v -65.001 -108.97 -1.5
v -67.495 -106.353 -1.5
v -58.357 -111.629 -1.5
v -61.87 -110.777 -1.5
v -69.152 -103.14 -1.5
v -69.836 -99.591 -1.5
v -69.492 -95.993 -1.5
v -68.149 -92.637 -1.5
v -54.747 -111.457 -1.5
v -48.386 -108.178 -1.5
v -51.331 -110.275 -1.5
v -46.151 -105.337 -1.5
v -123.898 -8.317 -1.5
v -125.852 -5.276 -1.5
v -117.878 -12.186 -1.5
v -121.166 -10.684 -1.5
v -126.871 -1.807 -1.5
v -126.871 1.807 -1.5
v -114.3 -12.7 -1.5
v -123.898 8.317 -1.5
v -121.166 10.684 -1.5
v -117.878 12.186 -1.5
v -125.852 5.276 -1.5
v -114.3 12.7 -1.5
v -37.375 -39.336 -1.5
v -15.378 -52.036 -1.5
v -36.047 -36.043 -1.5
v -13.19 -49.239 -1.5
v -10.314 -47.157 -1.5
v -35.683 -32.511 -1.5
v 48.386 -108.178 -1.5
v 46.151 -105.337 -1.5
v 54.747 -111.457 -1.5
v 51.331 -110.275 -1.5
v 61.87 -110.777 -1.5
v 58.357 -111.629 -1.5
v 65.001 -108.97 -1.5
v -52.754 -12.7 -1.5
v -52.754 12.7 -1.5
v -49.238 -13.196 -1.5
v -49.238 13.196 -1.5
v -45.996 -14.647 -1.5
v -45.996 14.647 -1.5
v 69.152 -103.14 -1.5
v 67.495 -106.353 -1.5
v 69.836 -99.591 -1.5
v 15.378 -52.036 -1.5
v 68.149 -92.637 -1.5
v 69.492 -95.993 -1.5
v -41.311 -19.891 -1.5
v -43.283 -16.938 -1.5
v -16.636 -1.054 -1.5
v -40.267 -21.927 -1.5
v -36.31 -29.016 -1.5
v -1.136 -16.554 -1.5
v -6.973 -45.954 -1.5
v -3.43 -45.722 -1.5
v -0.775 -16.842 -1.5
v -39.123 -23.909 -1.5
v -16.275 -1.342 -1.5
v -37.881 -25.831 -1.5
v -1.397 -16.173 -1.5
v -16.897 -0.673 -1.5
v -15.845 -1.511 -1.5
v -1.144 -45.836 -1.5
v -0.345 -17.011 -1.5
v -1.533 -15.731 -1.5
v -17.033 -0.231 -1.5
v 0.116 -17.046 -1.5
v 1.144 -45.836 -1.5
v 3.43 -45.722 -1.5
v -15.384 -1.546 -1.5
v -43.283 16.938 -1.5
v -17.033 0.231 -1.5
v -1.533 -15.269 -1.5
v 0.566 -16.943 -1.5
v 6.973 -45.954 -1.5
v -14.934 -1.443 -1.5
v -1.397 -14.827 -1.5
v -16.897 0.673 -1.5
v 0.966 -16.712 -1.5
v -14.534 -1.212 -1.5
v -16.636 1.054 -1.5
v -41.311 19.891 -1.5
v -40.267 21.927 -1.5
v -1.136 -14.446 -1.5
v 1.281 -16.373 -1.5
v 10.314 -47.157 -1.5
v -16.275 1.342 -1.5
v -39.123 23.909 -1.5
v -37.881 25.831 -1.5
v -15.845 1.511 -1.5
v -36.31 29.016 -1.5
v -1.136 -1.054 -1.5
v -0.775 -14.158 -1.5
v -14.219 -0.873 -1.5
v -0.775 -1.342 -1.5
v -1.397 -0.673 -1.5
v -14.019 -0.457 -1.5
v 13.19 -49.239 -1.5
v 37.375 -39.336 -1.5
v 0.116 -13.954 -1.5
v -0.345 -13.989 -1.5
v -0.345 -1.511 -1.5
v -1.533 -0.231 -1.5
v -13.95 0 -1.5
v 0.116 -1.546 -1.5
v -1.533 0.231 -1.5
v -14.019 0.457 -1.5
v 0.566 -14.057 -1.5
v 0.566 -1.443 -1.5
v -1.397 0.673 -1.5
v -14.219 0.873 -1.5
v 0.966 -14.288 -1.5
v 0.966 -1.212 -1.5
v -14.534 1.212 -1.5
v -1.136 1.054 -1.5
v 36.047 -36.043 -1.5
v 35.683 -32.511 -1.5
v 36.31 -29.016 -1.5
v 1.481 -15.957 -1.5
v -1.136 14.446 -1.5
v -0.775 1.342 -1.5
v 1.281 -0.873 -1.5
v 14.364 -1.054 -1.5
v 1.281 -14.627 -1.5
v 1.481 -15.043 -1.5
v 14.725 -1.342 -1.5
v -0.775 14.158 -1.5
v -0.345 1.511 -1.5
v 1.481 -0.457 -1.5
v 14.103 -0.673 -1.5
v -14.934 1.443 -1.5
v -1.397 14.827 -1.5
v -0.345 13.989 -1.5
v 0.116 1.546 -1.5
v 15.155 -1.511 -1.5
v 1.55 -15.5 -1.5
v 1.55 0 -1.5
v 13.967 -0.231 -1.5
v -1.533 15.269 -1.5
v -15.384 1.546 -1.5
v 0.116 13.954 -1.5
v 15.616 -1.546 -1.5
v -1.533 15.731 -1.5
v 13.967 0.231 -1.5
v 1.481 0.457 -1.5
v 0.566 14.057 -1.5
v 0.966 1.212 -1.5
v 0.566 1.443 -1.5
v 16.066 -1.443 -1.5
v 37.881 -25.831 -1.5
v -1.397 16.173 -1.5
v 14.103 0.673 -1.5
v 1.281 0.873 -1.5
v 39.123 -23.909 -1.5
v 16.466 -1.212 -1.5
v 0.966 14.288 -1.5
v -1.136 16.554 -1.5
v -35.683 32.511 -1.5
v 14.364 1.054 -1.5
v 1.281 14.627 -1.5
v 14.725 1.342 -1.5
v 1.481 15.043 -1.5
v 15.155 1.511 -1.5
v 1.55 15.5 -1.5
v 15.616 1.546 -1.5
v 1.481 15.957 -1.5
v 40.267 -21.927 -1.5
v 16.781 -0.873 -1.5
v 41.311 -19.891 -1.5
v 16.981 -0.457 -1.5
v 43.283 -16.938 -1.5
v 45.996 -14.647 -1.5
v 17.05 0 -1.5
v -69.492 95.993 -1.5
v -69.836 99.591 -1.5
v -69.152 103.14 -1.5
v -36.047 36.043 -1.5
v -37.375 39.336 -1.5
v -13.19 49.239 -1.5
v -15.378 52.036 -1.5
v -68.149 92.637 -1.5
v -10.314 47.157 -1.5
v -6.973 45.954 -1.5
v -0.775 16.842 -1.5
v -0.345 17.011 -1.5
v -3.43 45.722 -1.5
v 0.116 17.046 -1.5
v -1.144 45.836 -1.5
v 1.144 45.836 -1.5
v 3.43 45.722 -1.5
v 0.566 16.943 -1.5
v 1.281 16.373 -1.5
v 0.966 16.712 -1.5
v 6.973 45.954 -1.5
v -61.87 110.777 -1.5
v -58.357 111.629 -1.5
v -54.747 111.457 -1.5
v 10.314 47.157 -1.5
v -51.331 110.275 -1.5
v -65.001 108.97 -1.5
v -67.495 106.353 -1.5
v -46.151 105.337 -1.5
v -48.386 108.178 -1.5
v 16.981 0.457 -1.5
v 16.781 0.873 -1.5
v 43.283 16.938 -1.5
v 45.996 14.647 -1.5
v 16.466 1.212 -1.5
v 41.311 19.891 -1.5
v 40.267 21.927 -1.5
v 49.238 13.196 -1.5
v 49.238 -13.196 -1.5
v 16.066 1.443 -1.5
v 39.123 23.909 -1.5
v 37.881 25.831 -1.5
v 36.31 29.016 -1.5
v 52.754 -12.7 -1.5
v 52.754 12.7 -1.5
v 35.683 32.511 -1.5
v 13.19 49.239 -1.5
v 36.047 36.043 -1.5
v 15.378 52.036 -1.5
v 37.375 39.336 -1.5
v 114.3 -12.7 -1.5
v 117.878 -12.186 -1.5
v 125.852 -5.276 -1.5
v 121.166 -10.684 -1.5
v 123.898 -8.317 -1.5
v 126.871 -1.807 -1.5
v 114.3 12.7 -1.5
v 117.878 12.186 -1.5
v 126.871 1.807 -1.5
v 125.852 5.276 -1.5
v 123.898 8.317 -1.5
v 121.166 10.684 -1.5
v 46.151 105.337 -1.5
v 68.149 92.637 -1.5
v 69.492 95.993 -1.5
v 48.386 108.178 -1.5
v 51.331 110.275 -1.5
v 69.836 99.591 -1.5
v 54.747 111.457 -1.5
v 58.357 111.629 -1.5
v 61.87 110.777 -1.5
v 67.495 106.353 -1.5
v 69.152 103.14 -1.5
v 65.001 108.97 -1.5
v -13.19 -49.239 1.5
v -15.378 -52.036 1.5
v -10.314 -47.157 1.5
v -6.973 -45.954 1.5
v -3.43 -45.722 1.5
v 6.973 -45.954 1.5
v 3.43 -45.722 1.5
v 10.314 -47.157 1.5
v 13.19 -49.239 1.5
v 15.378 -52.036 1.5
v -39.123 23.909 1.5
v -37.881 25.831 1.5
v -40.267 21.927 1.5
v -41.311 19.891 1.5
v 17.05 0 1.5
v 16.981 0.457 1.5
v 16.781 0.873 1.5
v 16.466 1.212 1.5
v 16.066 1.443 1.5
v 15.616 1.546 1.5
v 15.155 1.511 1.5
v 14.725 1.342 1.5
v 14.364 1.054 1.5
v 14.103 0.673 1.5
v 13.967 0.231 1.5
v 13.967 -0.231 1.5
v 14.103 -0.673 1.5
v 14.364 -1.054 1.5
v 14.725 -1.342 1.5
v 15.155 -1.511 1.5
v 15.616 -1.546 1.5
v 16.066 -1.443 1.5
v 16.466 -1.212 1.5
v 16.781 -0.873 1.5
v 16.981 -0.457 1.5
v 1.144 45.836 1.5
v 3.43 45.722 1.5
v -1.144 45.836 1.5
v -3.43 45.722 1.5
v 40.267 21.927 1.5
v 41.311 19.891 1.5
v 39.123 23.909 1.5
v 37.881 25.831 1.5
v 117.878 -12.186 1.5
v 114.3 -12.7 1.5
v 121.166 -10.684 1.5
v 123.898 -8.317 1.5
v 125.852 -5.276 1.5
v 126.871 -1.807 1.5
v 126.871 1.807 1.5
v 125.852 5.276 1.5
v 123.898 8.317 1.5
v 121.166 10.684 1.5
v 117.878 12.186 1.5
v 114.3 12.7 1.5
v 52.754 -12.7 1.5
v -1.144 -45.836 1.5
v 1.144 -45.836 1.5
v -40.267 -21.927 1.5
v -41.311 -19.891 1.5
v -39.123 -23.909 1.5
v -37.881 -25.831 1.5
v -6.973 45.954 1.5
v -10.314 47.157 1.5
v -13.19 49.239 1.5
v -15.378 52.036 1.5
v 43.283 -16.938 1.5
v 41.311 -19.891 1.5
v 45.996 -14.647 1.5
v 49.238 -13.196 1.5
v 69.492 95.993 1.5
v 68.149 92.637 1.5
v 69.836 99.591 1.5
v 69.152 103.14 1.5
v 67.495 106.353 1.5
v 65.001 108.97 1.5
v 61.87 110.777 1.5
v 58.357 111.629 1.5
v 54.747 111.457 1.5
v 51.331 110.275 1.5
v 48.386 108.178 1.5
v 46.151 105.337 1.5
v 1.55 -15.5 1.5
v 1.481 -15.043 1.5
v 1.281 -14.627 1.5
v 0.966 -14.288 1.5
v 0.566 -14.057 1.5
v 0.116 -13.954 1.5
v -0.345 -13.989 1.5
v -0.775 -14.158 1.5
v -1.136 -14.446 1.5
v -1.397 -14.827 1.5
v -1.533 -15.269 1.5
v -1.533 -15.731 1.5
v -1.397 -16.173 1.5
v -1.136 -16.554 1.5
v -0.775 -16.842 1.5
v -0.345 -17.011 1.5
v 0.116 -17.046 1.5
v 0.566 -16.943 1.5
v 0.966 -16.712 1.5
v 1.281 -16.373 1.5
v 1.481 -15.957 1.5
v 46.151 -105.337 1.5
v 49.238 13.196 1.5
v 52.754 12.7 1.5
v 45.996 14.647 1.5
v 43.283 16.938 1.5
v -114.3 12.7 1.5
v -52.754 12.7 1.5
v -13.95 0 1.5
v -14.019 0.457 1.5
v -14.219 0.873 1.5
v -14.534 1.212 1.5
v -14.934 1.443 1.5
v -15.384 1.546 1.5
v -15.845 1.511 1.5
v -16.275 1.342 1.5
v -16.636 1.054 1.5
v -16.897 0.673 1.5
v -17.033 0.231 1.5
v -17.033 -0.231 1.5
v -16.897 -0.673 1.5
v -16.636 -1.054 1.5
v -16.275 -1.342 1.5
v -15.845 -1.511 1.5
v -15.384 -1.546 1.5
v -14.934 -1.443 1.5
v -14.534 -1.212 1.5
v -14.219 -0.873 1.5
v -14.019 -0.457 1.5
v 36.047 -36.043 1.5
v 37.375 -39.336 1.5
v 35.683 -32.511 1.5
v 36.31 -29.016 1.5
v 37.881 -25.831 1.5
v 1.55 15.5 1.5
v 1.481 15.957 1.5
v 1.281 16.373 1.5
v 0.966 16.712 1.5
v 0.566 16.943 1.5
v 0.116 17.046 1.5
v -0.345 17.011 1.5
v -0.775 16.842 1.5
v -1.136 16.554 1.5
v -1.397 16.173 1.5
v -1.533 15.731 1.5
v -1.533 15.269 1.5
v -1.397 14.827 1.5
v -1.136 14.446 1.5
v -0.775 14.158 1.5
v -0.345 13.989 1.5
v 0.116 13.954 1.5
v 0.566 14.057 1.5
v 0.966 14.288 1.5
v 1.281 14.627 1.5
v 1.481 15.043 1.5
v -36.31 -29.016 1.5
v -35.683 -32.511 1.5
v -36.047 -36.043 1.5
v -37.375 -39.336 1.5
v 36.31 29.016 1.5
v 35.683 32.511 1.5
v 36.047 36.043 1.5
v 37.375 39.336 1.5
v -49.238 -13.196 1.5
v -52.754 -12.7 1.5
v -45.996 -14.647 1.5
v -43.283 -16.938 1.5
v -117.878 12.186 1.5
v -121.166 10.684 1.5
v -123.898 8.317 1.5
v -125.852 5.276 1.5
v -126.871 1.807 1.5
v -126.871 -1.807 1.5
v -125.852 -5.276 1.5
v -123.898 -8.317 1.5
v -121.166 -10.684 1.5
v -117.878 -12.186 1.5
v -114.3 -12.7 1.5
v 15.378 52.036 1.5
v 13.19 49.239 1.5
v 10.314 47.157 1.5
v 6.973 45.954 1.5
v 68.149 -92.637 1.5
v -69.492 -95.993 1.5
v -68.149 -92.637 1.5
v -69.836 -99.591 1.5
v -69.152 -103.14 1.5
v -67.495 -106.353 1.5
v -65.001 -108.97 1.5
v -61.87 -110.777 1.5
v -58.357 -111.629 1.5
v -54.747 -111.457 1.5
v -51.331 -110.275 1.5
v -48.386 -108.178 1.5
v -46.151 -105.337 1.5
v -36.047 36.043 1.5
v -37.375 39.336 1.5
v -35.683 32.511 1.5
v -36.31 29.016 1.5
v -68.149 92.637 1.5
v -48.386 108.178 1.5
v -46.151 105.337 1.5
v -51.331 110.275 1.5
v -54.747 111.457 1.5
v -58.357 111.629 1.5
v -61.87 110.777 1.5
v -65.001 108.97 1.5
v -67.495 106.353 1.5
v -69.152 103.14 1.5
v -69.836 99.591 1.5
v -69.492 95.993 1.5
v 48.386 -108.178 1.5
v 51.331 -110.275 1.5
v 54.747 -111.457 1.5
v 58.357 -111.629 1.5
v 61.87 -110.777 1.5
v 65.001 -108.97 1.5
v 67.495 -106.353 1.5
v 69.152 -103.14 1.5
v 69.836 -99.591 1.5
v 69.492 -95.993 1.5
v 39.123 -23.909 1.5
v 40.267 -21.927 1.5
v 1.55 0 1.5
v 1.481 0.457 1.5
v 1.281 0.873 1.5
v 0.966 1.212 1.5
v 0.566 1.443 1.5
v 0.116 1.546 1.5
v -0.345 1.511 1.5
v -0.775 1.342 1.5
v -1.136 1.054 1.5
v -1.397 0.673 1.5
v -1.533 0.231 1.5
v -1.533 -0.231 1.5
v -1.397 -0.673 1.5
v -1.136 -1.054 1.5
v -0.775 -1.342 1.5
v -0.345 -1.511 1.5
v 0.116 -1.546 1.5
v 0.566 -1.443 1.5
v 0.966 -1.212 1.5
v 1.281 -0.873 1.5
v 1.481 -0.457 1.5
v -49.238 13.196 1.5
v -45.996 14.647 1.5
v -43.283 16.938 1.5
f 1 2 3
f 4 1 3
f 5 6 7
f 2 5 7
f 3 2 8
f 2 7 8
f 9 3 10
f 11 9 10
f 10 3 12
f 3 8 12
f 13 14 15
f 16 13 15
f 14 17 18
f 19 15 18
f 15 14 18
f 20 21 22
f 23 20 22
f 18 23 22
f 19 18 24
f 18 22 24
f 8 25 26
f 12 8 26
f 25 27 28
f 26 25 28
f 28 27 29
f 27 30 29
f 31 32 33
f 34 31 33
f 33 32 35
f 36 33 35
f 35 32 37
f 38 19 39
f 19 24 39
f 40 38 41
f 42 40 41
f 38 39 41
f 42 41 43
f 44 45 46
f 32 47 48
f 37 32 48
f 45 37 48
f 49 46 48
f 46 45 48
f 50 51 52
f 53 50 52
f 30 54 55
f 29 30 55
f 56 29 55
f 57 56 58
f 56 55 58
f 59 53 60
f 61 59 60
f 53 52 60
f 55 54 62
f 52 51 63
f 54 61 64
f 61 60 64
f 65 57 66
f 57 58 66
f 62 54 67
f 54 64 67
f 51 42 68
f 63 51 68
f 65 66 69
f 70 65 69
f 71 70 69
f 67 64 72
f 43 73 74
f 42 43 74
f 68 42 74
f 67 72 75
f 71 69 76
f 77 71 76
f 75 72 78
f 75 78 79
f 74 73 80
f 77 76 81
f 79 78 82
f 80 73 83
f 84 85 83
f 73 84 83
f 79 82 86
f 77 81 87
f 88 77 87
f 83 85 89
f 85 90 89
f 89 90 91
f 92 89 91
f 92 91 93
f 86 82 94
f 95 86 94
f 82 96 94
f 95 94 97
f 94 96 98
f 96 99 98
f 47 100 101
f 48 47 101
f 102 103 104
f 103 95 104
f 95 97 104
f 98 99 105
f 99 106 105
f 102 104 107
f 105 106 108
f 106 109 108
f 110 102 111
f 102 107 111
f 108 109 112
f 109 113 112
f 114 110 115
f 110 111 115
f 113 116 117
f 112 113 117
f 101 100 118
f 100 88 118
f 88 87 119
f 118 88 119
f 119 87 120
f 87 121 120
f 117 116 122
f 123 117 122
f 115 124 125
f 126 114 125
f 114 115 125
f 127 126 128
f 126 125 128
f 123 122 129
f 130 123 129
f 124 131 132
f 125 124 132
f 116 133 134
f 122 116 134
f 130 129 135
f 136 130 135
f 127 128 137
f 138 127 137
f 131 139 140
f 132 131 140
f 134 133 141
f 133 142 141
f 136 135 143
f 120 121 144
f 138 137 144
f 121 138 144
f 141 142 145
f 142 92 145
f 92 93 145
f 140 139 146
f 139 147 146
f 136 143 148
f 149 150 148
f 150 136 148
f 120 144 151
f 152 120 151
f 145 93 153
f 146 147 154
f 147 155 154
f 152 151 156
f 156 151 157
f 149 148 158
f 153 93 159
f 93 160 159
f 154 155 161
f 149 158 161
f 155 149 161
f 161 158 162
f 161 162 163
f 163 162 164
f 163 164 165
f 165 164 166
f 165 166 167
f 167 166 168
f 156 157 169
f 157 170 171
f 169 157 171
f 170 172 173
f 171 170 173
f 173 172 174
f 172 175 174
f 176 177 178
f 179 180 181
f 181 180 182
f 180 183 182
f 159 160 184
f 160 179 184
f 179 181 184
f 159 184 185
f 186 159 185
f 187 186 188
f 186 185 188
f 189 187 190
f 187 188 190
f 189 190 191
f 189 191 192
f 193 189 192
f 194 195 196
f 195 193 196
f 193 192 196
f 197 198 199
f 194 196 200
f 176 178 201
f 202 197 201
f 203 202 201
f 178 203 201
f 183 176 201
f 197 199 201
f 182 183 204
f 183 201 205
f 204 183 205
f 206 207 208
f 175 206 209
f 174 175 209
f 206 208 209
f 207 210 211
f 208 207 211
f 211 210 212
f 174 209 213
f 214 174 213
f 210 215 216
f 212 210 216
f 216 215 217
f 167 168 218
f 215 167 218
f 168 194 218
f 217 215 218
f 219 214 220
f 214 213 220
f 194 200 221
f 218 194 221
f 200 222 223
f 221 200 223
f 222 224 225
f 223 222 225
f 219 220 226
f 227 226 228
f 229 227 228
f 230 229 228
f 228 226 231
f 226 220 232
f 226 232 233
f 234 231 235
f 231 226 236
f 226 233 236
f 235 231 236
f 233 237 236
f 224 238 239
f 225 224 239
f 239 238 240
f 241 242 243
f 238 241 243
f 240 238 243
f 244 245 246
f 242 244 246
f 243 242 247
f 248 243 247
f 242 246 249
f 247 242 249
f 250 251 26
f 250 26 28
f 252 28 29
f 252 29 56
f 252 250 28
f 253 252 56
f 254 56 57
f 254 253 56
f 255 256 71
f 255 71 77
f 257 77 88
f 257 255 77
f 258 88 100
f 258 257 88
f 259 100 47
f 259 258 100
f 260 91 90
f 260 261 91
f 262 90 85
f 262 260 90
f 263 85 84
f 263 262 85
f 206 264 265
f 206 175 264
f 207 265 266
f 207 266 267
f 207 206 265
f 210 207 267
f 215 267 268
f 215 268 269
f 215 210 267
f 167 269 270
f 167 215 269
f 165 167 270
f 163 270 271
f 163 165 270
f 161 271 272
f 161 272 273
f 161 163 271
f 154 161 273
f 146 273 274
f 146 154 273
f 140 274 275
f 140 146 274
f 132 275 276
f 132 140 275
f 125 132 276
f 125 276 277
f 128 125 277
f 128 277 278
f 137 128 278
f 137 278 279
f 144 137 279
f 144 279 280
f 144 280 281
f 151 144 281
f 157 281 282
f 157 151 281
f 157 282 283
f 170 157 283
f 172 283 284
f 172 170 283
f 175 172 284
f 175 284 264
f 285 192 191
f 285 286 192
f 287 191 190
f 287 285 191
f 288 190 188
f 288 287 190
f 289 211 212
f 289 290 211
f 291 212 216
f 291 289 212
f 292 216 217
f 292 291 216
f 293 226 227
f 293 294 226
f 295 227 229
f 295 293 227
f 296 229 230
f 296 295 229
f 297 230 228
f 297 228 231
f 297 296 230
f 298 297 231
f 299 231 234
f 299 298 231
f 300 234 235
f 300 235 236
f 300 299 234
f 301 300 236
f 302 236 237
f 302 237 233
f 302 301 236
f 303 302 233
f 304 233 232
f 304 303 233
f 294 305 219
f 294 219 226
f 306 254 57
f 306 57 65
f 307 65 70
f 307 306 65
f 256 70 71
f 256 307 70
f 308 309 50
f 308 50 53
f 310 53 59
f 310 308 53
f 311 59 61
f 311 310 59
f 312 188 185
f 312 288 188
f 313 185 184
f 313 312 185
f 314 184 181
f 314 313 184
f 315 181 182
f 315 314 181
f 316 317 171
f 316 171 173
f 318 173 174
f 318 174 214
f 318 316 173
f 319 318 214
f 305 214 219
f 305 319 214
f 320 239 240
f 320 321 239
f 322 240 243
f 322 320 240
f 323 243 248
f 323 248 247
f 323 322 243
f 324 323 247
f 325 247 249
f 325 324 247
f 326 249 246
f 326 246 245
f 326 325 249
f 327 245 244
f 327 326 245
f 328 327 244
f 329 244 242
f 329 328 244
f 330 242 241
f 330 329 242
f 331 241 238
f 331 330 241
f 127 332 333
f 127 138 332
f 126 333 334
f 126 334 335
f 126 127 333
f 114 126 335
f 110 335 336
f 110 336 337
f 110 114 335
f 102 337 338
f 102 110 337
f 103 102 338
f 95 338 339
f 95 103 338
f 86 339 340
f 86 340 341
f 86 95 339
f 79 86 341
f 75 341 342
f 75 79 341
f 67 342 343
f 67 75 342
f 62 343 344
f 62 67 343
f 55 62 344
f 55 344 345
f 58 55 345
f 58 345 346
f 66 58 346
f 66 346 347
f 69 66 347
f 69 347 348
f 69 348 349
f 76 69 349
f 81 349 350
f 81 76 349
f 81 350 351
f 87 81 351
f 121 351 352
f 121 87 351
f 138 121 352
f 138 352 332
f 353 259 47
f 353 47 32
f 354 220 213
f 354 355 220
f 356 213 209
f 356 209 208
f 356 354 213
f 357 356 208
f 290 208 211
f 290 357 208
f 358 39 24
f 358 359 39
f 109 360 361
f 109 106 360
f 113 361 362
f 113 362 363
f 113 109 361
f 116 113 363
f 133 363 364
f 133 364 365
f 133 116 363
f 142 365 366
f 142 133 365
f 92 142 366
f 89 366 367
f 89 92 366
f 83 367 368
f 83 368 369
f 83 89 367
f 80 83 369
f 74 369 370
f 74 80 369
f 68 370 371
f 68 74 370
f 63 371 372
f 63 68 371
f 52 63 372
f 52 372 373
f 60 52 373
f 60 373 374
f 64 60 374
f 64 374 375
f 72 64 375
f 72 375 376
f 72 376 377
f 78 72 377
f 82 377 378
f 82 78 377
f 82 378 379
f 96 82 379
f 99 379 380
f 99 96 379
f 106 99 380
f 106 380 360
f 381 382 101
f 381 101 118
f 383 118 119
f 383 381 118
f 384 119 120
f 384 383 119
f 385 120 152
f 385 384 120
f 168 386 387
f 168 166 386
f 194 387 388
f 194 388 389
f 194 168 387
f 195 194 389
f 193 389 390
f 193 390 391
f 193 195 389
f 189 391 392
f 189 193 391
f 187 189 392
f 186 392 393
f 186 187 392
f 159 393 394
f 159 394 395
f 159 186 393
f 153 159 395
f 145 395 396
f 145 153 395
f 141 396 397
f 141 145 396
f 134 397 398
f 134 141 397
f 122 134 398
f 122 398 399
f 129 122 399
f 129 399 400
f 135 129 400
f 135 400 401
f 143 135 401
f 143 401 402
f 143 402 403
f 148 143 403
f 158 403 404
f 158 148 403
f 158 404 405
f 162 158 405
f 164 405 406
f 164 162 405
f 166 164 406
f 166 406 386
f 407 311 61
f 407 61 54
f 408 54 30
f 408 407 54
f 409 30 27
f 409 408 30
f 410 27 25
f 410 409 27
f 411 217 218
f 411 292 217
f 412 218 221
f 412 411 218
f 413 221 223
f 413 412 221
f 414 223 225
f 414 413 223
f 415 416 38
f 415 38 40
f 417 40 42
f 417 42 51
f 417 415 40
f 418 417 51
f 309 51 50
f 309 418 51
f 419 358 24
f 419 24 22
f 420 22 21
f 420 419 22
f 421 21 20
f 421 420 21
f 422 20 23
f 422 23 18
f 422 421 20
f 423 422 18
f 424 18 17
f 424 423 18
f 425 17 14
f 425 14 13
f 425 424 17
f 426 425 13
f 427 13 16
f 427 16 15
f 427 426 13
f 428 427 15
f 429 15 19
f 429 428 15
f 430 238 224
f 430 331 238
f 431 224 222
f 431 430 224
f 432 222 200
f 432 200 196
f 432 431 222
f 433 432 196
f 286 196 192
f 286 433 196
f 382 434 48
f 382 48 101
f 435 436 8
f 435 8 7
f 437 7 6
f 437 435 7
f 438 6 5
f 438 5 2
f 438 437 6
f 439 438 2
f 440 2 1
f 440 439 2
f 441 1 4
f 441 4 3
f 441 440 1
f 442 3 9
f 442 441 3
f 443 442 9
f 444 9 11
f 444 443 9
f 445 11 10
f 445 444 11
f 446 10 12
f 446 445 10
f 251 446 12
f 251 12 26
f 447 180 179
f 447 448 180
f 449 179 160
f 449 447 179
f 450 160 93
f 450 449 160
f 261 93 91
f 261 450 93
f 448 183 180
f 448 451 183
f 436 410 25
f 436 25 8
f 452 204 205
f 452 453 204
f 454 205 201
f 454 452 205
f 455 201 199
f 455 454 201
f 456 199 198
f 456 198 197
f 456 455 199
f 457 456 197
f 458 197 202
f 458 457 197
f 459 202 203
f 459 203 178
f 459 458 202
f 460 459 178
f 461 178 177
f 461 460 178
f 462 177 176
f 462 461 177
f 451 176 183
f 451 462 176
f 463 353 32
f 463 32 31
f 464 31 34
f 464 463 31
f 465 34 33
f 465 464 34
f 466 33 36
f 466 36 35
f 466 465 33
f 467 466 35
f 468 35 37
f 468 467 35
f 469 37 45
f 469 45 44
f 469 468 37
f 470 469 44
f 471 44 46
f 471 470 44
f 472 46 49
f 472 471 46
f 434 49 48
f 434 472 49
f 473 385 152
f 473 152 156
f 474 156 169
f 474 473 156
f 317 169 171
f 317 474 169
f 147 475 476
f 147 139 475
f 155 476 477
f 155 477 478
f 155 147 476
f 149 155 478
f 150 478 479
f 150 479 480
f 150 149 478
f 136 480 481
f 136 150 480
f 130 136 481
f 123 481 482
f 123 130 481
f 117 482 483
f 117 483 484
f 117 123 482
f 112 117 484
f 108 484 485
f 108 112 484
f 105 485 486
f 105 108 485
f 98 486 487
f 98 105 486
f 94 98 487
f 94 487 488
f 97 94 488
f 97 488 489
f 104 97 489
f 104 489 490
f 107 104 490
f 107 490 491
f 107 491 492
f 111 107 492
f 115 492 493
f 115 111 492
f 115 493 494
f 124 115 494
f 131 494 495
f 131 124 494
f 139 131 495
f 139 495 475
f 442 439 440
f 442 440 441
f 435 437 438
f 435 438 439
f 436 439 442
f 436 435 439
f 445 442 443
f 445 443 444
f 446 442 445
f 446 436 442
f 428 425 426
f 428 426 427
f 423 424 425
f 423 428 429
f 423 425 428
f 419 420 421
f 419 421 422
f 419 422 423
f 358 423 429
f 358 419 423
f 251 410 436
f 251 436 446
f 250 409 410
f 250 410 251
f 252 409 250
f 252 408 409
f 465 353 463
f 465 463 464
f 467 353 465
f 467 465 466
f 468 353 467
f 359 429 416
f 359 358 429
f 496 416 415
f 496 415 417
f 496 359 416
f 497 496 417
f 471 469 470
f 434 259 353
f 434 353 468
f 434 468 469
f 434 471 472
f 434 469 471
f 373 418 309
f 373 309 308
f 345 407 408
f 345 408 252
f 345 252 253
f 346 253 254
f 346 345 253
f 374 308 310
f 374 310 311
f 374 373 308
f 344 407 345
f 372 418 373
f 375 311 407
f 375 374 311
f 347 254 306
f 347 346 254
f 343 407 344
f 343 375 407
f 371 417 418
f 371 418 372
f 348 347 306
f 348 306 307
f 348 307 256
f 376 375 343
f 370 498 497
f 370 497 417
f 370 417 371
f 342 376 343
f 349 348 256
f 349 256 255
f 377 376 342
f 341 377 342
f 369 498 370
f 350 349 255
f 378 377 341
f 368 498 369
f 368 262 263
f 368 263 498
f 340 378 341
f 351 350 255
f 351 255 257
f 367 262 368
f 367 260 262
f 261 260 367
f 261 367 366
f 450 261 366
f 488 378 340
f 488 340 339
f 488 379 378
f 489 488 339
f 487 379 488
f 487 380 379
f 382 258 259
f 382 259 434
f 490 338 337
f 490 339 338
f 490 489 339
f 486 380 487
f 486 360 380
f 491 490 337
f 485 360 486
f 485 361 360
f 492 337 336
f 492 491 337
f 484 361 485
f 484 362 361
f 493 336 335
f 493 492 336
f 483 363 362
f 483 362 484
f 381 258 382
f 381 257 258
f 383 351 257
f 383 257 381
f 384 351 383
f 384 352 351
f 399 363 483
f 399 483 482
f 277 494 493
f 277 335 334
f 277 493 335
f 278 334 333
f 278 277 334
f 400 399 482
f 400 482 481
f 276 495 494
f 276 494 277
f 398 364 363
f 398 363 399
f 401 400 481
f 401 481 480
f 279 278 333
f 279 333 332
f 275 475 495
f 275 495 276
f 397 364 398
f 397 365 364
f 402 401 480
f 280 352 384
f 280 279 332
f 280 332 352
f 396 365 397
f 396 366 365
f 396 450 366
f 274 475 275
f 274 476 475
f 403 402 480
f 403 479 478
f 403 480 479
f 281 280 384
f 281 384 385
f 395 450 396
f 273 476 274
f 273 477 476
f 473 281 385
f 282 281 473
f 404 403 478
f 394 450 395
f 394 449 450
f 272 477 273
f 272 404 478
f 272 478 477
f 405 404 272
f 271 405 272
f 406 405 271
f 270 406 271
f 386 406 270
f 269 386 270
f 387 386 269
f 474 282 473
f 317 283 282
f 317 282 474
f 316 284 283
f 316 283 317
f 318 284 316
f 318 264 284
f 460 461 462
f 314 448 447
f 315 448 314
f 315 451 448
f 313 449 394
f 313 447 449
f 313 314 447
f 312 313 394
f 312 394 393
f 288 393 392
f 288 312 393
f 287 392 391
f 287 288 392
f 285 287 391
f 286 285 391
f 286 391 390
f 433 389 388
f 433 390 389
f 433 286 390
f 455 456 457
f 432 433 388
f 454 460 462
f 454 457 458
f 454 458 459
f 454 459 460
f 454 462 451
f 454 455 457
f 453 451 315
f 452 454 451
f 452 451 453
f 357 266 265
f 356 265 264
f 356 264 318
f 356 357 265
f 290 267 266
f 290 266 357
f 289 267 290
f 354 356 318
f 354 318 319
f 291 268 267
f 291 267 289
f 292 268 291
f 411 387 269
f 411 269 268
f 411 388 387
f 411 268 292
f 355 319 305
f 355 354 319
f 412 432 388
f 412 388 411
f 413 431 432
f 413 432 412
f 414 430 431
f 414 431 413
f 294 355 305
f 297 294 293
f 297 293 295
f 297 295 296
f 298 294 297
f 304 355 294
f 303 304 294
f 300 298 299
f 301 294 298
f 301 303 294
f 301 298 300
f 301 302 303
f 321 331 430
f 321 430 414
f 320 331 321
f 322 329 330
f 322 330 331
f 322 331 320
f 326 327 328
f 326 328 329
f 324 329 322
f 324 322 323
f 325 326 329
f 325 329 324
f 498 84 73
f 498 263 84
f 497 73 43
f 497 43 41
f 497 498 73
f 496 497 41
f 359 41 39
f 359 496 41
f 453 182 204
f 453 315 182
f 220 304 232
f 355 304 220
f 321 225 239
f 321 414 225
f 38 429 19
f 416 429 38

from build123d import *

# Parameters (mm, degrees)
CROQUIS1_R              = 1.55
SALIENTE_EXTRUIR1_DEPTH = 1.5


with BuildPart() as part:
    # Croquis1 → Saliente-Extruir1 (new, symmetric)
    with BuildSketch(Plane.XY):
        with BuildLine():
            Line((-52.753601773, 12.7), (-114.3, 12.7))
            ThreePointArc((-114.3, 12.7), (-127, 0), (-114.3, -12.7))
            Line((-114.3, -12.7), (-52.753601773, -12.7))
            ThreePointArc((-52.753601773, -12.7), (-45.996397628, -14.646851989), (-41.310890543, -19.890520922))
            ThreePointArc((-41.310890543, -19.890520922), (-39.707264764, -22.925), (-37.881141685, -25.831020202))
            ThreePointArc((-37.881141685, -25.831020202), (-35.682744722, -32.510622834), (-37.375323514, -39.335959276))
            Line((-37.375323514, -39.335959276), (-68.148522628, -92.636703653))
            ThreePointArc((-68.148522628, -92.636703653), (-63.5, -109.985226281), (-46.151477372, -105.336703653))
            Line((-46.151477372, -105.336703653), (-15.378278258, -52.035959276))
            ThreePointArc((-15.378278258, -52.035959276), (-10.313652906, -47.157474823), (-3.429748858, -45.721541124))
            ThreePointArc((-3.429748858, -45.721541124), (0, -45.85), (3.429748858, -45.721541124))
            ThreePointArc((3.429748858, -45.721541124), (10.313652906, -47.157474823), (15.378278258, -52.035959276))
            Line((15.378278258, -52.035959276), (46.151477372, -105.336703653))
            ThreePointArc((46.151477372, -105.336703653), (63.5, -109.985226281), (68.148522628, -92.636703653))
            Line((68.148522628, -92.636703653), (37.375323514, -39.335959276))
            ThreePointArc((37.375323514, -39.335959276), (35.682744722, -32.510622834), (37.881141685, -25.831020202))
            ThreePointArc((37.881141685, -25.831020202), (39.707264764, -22.925), (41.310890543, -19.890520922))
            ThreePointArc((41.310890543, -19.890520922), (45.996397628, -14.646851989), (52.753601773, -12.7))
            Line((52.753601773, -12.7), (114.3, -12.7))
            ThreePointArc((114.3, -12.7), (127, 0), (114.3, 12.7))
            Line((114.3, 12.7), (52.753601773, 12.7))
            ThreePointArc((52.753601773, 12.7), (45.996397628, 14.646851989), (41.310890543, 19.890520922))
            ThreePointArc((41.310890543, 19.890520922), (39.707264764, 22.925), (37.881141685, 25.831020202))
            ThreePointArc((37.881141685, 25.831020202), (35.682744722, 32.510622834), (37.375323514, 39.335959276))
            Line((37.375323514, 39.335959276), (68.148522628, 92.636703653))
            ThreePointArc((68.148522628, 92.636703653), (63.5, 109.985226281), (46.151477372, 105.336703653))
            Line((46.151477372, 105.336703653), (15.378278258, 52.035959276))
            ThreePointArc((15.378278258, 52.035959276), (10.313652906, 47.157474823), (3.429748858, 45.721541124))
            ThreePointArc((3.429748858, 45.721541124), (0, 45.85), (-3.429748858, 45.721541124))
            ThreePointArc((-3.429748858, 45.721541124), (-10.313652906, 47.157474823), (-15.378278258, 52.035959276))
            Line((-15.378278258, 52.035959276), (-46.151477372, 105.336703653))
            ThreePointArc((-46.151477372, 105.336703653), (-63.5, 109.985226281), (-68.148522628, 92.636703653))
            Line((-68.148522628, 92.636703653), (-37.375323514, 39.335959276))
            ThreePointArc((-37.375323514, 39.335959276), (-35.682744722, 32.510622834), (-37.881141685, 25.831020202))
            ThreePointArc((-37.881141685, 25.831020202), (-39.707264764, 22.925), (-41.310890543, 19.890520922))
            ThreePointArc((-41.310890543, 19.890520922), (-45.996397628, 14.646851989), (-52.753601773, 12.7))
        make_face()
        Circle(CROQUIS1_R, mode=Mode.SUBTRACT)
        with Locations((0, 15.5)):
            Circle(CROQUIS1_R, mode=Mode.SUBTRACT)
        with Locations((15.5, 0)):
            Circle(CROQUIS1_R, mode=Mode.SUBTRACT)
        with Locations((0, -15.5)):
            Circle(CROQUIS1_R, mode=Mode.SUBTRACT)
        with Locations((-15.5, 0)):
            Circle(CROQUIS1_R, mode=Mode.SUBTRACT)
    extrude(amount=SALIENTE_EXTRUIR1_DEPTH, both=True)


solid = part.part
